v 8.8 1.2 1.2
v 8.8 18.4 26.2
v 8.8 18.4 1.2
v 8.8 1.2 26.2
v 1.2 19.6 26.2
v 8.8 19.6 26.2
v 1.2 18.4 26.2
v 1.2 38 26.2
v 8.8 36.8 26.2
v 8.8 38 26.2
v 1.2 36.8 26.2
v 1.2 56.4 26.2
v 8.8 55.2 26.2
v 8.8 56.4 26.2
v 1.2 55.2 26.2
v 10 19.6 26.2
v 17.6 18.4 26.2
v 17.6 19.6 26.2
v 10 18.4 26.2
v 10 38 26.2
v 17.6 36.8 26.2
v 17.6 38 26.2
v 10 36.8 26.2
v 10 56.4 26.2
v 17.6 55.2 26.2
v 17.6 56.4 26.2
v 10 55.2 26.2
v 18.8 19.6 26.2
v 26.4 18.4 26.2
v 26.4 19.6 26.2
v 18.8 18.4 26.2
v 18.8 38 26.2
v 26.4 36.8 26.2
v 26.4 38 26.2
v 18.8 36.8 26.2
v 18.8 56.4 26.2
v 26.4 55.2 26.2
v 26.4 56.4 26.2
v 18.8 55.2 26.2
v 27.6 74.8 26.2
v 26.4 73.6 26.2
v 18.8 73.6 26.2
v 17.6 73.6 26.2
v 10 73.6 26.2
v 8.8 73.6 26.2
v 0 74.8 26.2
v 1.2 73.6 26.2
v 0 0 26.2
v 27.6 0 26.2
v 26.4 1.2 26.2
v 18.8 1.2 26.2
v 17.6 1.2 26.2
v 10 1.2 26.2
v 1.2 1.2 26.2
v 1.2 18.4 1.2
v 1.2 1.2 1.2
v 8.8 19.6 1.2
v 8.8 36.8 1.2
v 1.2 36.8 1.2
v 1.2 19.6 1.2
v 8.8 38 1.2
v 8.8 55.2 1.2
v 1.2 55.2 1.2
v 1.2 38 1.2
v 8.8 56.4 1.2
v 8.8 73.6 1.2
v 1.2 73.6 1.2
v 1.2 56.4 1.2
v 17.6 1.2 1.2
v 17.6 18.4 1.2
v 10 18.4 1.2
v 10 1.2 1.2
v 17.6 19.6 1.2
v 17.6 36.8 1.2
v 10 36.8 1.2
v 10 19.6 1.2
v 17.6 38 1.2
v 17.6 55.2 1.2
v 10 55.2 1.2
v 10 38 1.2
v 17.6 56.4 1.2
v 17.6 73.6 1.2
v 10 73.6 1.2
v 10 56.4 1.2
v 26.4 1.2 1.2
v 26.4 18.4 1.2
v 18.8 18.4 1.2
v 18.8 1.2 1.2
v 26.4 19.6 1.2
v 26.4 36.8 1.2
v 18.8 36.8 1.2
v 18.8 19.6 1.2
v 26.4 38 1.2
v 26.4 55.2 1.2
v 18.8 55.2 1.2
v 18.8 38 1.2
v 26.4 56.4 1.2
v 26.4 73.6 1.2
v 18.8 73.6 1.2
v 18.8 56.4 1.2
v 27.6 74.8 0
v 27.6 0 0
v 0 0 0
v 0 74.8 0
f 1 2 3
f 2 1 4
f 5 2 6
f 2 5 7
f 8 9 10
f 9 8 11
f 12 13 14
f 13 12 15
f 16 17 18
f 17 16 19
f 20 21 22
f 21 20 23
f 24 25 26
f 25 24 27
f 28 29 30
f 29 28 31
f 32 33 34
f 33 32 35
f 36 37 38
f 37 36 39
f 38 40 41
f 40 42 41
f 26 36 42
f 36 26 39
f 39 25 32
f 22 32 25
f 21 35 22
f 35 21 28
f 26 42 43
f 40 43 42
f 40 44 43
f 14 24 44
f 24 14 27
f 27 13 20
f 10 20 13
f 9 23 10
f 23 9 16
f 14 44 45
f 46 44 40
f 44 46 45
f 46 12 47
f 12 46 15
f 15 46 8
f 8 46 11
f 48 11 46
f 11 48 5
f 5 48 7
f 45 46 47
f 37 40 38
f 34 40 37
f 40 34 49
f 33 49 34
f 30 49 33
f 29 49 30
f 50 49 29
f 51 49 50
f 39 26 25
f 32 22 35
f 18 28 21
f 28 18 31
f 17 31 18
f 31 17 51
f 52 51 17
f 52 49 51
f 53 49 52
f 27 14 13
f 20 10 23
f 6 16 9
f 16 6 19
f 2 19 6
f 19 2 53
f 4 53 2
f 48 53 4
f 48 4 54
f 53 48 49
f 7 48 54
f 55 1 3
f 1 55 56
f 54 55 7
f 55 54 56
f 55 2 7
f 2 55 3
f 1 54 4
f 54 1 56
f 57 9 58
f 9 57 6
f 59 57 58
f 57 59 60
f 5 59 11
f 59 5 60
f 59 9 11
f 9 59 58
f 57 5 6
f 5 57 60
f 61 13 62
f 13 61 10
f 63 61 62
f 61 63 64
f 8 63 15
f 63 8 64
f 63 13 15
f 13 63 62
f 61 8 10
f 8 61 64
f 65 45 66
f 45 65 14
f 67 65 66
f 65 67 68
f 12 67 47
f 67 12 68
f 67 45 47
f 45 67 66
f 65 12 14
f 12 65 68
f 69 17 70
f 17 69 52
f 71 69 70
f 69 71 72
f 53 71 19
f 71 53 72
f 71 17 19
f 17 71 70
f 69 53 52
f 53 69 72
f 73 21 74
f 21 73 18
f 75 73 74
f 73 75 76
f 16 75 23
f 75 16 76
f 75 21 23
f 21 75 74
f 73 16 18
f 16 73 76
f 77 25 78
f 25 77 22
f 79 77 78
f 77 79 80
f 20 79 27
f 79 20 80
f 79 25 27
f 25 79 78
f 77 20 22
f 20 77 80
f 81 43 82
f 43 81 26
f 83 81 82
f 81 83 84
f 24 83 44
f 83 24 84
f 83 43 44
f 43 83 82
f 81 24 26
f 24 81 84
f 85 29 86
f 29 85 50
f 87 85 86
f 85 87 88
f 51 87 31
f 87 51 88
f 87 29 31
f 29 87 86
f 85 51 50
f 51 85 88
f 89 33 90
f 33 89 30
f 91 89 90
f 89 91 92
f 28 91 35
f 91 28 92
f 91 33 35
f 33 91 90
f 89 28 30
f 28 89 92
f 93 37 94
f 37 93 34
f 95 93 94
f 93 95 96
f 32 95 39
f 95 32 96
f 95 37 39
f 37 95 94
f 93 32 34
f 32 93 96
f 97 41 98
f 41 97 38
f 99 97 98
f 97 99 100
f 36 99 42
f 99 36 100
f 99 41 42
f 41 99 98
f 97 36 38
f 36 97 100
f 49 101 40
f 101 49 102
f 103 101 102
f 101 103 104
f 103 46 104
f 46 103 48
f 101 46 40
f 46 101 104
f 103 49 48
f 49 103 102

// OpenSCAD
cols = 3;
rows = 4;

walls = 1.2;
bottom = 1.2;

depth = 17.2;
width = 7.6;

height = 25;

echo(rows* depth + (rows + 1) * depth);
render() {
  difference() {
    cube([cols * width + (cols + 1) * walls, rows * depth + (rows + 1) * walls, height + bottom]);
    for (i = [0:cols - 1]) {
      for (j = [0:rows - 1]) {
        translate([i * width + walls * (i + 1), j * depth + walls * (j + 1), bottom]) {
          cube([width, depth, height]);
        }
      }
    }
  }
}
